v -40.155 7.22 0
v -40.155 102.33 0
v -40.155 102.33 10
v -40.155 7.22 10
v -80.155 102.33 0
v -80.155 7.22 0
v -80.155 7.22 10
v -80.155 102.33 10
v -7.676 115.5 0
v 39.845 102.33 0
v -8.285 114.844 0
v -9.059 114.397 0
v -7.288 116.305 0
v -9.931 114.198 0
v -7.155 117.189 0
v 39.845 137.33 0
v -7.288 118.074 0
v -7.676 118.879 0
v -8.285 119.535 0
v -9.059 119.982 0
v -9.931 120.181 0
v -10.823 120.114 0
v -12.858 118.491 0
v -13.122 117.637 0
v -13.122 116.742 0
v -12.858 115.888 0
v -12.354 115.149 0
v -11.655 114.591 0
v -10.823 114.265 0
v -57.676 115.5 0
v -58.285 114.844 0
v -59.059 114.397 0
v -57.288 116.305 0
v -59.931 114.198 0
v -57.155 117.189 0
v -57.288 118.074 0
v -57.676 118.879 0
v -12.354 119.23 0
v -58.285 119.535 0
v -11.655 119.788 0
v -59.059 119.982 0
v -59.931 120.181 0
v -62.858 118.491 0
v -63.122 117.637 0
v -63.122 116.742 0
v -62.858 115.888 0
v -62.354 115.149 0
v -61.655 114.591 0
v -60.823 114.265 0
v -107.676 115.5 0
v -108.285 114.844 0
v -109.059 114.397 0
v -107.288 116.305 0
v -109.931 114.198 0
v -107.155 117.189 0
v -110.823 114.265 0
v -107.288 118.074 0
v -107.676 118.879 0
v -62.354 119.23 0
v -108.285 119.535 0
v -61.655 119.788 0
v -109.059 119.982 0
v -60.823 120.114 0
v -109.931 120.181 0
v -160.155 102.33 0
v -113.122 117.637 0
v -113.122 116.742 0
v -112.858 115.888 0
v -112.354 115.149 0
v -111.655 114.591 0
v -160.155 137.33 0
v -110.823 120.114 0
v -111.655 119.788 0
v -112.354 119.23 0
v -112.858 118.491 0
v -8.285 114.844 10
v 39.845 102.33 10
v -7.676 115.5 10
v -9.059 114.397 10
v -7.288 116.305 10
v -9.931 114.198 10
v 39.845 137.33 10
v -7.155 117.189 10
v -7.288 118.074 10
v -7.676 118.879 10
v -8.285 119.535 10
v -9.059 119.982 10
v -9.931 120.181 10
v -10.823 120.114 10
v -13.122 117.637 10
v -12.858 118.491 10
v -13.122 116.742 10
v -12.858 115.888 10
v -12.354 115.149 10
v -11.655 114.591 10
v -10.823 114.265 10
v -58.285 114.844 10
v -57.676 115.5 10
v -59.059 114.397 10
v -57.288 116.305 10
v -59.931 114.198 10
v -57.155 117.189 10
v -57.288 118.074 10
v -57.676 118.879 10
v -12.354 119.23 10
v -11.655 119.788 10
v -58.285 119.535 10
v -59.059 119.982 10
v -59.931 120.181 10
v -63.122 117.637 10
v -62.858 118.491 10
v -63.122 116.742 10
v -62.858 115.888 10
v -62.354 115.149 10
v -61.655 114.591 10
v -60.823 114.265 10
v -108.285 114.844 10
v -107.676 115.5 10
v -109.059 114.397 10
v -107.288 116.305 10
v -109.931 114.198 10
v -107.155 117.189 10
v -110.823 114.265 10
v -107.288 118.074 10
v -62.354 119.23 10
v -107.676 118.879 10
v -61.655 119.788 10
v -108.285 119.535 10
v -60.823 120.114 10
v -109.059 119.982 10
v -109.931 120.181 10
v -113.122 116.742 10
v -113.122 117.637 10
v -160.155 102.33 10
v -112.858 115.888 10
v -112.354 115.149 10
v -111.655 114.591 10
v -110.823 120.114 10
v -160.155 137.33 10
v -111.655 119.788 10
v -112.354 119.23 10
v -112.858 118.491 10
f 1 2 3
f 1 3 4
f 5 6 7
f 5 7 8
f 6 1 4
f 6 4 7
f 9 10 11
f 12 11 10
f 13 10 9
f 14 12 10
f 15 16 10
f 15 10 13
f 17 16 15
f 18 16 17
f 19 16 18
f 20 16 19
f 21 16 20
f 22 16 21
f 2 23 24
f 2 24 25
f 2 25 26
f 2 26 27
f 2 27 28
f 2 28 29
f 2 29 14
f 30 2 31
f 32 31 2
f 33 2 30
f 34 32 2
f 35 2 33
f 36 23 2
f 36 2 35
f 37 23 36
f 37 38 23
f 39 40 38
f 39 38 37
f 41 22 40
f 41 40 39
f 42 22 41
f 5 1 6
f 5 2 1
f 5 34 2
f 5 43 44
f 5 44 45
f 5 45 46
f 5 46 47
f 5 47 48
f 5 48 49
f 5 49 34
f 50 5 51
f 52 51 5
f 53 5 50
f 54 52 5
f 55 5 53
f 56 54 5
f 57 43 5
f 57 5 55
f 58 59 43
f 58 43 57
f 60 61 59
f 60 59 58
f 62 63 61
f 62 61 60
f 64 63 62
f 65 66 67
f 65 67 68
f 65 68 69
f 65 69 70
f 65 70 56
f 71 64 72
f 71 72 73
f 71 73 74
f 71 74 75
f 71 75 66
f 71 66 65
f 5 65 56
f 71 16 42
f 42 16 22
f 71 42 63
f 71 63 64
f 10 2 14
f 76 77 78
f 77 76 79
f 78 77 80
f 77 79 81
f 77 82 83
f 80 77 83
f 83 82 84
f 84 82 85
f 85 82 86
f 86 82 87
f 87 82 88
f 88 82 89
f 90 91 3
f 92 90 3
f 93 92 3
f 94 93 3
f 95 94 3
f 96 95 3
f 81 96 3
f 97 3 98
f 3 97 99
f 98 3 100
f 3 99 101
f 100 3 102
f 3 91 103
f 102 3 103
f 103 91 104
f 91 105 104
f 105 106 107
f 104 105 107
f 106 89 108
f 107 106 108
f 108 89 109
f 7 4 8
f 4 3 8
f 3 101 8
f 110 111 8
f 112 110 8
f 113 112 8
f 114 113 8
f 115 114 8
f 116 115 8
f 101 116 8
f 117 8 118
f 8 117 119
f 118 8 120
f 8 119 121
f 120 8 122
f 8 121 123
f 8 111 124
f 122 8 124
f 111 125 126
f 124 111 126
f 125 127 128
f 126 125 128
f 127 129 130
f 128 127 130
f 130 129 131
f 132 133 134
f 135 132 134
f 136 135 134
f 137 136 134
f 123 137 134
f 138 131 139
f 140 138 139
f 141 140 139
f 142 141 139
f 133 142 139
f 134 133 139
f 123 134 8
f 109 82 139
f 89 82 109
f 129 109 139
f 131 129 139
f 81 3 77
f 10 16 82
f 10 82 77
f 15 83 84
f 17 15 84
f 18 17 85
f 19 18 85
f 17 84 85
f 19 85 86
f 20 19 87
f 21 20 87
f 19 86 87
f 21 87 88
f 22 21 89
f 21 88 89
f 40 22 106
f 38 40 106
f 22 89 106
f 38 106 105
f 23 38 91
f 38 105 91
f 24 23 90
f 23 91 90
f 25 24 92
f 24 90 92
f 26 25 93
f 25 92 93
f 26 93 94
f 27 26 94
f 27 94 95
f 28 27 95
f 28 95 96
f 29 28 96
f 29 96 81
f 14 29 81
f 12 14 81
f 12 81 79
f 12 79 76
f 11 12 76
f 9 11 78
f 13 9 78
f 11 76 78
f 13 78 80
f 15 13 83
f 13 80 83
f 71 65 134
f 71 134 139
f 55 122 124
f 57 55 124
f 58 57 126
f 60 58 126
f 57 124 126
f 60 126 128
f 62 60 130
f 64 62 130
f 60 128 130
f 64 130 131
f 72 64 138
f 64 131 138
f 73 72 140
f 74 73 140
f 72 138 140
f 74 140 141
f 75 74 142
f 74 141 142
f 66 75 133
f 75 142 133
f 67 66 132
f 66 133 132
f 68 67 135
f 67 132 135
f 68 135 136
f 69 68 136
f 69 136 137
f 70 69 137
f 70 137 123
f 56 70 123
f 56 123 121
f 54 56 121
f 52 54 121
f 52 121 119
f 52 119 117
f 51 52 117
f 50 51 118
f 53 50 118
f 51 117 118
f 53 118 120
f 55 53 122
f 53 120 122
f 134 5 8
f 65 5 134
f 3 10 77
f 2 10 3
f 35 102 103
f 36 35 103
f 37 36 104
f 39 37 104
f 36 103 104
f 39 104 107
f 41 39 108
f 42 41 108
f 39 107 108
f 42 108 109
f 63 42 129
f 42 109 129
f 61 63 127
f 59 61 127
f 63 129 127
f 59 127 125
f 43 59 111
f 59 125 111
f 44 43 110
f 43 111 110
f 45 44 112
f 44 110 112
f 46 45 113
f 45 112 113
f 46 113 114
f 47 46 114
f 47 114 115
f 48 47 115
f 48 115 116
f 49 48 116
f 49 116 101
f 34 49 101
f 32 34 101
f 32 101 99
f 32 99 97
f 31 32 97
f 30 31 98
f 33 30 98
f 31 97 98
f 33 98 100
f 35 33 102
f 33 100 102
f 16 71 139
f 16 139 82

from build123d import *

# Parameters (mm, degrees)
EXTRUDE_1_DEPTH     = 10
SKETCH_2_R          = 3
CUT_EXTRUDE_1_DEPTH = 10
LPATTERN1_COUNT     = 3
LPATTERN1_PITCH     = 50


with BuildPart() as part:
    # 草圖1 → 填料-伸長1 (new body)
    with BuildSketch(Plane.XY):
        Polygon((-40.155141061, 7.219614063), (-80.155141061, 7.219614063), (-80.155141061, 102.329702578), (-160.155141061, 102.329702578), (-160.155141061, 137.329702578), (39.844858939, 137.329702578), (39.844858939, 102.329702578), (-40.155141061, 102.329702578), align=None)
    extrude(amount=EXTRUDE_1_DEPTH)

    # 草圖2 → 除料-伸長1 (cut)
    with BuildSketch(Plane.XY.offset(10)):
        with Locations((-10.155141061, 117.189491535)):
            Circle(SKETCH_2_R)
    cut_extrude_1 = extrude(amount=-CUT_EXTRUDE_1_DEPTH, mode=Mode.SUBTRACT)

    # LPattern1: 除料-伸長1 ×3
    with Locations(*[(-i * LPATTERN1_PITCH, 0, 0) for i in range(1, LPATTERN1_COUNT)]):
        add(cut_extrude_1, mode=Mode.SUBTRACT)


solid = part.part
